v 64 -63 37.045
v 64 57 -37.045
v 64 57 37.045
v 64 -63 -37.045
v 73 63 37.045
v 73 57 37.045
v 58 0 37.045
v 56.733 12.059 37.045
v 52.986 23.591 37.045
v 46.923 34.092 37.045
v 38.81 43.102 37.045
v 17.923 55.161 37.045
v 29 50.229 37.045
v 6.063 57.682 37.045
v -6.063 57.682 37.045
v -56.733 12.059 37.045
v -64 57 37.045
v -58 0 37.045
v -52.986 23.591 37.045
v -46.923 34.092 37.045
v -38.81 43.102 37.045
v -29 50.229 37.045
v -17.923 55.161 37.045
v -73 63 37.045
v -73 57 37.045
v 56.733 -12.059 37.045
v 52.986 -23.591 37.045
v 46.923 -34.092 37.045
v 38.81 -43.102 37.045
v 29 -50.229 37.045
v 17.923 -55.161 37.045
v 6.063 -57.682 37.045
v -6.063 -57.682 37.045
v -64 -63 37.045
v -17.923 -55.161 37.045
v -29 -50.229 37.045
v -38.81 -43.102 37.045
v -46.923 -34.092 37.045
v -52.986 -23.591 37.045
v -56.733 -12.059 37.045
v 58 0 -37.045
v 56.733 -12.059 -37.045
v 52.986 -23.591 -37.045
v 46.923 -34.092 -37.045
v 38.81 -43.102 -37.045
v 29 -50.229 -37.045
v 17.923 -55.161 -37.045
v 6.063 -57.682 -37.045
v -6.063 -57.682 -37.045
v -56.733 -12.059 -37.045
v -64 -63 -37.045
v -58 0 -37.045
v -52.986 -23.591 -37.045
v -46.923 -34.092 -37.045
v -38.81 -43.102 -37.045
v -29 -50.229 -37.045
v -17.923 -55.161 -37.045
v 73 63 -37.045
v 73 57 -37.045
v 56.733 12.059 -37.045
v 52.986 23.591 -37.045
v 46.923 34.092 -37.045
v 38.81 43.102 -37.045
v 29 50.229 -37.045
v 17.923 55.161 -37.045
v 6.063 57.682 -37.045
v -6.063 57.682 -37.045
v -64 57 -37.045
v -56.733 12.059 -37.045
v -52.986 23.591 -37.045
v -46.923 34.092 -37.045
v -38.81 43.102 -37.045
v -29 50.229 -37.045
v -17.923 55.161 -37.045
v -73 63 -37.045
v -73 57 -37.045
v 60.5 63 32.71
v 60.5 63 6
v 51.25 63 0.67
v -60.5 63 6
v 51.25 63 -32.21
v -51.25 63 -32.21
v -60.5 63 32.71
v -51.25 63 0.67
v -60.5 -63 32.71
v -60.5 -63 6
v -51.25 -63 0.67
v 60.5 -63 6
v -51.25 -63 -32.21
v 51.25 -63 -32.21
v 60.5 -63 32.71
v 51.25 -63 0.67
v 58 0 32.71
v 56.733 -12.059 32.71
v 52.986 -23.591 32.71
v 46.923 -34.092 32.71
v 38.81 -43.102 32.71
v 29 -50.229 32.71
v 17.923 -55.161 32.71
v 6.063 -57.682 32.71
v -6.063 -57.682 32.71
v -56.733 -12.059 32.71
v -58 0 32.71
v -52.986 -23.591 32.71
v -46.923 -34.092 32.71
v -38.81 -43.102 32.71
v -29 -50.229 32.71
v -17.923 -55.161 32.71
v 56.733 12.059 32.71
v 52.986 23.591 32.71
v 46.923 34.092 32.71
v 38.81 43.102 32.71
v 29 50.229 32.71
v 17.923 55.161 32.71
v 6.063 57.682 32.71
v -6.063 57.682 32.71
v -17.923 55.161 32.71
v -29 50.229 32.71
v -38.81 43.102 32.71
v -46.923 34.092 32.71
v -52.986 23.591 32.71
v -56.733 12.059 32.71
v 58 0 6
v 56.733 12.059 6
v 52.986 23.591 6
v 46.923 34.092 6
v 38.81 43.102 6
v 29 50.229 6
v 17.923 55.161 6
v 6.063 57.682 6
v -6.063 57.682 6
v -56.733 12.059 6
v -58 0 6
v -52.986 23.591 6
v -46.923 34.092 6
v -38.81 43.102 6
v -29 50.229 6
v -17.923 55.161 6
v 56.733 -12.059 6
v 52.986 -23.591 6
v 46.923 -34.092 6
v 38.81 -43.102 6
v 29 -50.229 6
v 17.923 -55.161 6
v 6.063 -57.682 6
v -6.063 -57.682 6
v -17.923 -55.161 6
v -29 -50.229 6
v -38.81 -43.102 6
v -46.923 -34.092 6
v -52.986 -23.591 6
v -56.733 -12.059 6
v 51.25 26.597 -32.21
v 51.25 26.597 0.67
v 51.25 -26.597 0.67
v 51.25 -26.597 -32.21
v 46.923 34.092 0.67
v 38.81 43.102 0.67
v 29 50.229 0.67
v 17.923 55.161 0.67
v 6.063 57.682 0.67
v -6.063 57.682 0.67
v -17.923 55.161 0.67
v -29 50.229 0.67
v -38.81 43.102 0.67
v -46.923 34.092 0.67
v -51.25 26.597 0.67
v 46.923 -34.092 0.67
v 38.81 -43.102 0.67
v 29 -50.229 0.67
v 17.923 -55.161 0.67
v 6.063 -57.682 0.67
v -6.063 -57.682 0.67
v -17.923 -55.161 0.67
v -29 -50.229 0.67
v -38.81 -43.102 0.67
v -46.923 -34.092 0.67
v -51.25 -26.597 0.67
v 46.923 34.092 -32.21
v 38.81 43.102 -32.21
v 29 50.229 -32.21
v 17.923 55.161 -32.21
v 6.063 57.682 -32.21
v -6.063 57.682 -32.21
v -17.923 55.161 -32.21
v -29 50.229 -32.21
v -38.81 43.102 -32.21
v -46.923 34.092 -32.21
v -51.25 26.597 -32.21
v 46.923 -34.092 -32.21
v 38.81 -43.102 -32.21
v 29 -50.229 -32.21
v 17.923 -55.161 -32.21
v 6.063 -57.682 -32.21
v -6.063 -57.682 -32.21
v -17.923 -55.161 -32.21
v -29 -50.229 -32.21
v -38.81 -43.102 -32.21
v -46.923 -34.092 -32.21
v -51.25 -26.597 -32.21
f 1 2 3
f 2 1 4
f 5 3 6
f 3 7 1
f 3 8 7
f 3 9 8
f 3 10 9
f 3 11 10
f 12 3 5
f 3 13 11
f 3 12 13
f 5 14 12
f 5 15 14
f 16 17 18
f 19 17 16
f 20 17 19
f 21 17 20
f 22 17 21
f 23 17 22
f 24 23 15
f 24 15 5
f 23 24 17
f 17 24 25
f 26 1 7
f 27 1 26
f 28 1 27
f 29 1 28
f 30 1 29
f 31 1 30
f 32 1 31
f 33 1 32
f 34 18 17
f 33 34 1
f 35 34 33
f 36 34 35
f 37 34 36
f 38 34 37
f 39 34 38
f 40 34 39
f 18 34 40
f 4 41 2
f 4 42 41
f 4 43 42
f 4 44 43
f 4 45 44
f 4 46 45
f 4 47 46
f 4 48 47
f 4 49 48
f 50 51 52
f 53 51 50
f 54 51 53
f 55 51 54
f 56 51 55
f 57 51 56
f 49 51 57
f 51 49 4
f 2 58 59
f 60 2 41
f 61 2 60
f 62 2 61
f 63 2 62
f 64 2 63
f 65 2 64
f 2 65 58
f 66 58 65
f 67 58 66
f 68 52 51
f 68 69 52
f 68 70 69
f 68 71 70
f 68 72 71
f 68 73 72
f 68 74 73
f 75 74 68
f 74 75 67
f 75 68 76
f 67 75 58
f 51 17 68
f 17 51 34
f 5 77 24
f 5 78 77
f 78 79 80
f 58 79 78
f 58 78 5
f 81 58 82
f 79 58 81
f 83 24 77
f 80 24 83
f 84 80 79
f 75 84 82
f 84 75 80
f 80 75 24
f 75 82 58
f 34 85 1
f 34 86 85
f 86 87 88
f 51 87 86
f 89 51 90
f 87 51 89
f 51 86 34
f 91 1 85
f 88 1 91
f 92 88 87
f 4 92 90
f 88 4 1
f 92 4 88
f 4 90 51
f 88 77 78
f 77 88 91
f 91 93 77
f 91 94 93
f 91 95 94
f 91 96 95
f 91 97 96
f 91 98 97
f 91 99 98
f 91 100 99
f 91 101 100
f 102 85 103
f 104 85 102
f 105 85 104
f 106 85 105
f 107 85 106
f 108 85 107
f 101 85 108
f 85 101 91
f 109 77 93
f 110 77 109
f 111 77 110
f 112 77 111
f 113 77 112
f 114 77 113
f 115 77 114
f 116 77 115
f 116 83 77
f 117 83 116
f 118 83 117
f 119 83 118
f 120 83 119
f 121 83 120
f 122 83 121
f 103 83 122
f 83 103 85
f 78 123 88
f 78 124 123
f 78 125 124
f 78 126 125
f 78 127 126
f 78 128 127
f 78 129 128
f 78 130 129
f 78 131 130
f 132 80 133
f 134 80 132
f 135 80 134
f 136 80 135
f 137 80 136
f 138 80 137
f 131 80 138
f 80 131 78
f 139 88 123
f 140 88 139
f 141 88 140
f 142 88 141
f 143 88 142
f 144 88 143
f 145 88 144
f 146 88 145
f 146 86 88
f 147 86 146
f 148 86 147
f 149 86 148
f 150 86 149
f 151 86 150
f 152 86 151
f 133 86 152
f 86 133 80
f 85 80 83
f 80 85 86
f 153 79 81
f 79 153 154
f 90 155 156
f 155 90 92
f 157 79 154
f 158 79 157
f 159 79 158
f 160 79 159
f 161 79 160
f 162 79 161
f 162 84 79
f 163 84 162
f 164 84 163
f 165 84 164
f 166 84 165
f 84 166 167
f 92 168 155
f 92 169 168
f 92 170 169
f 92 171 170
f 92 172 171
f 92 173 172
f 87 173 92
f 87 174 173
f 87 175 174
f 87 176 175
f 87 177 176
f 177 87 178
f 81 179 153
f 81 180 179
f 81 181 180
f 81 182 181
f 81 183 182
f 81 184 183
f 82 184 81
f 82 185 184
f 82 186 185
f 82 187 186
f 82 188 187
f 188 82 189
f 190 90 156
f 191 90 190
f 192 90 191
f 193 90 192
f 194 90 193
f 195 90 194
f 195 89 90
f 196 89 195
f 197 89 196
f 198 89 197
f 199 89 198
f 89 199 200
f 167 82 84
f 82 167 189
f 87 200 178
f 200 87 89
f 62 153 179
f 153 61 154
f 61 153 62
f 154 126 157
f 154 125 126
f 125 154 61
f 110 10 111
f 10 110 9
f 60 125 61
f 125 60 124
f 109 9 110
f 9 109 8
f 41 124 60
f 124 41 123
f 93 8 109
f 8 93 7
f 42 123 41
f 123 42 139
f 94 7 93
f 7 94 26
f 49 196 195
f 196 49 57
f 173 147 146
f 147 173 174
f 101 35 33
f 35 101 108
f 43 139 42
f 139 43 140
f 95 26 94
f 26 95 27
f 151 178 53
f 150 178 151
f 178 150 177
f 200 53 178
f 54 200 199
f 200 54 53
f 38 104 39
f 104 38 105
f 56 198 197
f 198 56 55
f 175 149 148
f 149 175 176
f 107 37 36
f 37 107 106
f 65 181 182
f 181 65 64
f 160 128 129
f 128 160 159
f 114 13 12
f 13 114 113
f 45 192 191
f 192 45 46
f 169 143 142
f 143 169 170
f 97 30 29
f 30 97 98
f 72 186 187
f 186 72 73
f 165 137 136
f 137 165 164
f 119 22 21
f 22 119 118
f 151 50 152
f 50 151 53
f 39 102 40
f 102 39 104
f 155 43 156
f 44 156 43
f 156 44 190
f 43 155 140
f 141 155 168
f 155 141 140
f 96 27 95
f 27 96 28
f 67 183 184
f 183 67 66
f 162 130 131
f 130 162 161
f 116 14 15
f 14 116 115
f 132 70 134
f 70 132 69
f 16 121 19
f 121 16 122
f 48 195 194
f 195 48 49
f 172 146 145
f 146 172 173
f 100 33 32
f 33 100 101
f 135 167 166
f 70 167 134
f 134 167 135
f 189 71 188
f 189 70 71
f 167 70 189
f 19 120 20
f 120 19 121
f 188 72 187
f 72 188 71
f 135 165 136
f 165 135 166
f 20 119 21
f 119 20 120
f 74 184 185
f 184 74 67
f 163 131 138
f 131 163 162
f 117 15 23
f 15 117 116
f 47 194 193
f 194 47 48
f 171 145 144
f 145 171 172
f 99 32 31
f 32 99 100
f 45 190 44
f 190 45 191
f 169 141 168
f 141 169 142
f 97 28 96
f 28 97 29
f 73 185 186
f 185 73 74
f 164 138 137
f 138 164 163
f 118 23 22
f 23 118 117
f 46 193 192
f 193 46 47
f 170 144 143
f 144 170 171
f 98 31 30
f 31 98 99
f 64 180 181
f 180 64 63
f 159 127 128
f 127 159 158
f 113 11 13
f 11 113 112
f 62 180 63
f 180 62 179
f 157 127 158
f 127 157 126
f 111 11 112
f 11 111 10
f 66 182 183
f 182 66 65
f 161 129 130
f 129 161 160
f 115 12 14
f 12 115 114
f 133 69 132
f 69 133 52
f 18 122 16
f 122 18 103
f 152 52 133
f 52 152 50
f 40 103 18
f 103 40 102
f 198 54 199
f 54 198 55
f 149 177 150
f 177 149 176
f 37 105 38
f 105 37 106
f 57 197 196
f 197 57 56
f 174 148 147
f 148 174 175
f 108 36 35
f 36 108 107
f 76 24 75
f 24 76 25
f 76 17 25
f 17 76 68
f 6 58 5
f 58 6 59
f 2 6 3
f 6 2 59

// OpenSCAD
module baseunit(){
	difference(){
		cube([128,126,74.09],center=true);
		translate([-60.5,-65,6]){
			cube([121,130,26.71]);
			}
		}
	}

module CondCut(){
difference(){
	baseunit();
	translate([-51.25,-65,-32.21]){
		cube([102.5,130,32.88]);
			}
	}
}

difference(){
	CondCut();
	cylinder(h=75, r=116/2, center=true);
	}

translate([-73,57,-37.045]){
	cube([9,6,74.09]);
}

translate([64,57,-37.045]){
	cube([9,6,74.09]);
}
